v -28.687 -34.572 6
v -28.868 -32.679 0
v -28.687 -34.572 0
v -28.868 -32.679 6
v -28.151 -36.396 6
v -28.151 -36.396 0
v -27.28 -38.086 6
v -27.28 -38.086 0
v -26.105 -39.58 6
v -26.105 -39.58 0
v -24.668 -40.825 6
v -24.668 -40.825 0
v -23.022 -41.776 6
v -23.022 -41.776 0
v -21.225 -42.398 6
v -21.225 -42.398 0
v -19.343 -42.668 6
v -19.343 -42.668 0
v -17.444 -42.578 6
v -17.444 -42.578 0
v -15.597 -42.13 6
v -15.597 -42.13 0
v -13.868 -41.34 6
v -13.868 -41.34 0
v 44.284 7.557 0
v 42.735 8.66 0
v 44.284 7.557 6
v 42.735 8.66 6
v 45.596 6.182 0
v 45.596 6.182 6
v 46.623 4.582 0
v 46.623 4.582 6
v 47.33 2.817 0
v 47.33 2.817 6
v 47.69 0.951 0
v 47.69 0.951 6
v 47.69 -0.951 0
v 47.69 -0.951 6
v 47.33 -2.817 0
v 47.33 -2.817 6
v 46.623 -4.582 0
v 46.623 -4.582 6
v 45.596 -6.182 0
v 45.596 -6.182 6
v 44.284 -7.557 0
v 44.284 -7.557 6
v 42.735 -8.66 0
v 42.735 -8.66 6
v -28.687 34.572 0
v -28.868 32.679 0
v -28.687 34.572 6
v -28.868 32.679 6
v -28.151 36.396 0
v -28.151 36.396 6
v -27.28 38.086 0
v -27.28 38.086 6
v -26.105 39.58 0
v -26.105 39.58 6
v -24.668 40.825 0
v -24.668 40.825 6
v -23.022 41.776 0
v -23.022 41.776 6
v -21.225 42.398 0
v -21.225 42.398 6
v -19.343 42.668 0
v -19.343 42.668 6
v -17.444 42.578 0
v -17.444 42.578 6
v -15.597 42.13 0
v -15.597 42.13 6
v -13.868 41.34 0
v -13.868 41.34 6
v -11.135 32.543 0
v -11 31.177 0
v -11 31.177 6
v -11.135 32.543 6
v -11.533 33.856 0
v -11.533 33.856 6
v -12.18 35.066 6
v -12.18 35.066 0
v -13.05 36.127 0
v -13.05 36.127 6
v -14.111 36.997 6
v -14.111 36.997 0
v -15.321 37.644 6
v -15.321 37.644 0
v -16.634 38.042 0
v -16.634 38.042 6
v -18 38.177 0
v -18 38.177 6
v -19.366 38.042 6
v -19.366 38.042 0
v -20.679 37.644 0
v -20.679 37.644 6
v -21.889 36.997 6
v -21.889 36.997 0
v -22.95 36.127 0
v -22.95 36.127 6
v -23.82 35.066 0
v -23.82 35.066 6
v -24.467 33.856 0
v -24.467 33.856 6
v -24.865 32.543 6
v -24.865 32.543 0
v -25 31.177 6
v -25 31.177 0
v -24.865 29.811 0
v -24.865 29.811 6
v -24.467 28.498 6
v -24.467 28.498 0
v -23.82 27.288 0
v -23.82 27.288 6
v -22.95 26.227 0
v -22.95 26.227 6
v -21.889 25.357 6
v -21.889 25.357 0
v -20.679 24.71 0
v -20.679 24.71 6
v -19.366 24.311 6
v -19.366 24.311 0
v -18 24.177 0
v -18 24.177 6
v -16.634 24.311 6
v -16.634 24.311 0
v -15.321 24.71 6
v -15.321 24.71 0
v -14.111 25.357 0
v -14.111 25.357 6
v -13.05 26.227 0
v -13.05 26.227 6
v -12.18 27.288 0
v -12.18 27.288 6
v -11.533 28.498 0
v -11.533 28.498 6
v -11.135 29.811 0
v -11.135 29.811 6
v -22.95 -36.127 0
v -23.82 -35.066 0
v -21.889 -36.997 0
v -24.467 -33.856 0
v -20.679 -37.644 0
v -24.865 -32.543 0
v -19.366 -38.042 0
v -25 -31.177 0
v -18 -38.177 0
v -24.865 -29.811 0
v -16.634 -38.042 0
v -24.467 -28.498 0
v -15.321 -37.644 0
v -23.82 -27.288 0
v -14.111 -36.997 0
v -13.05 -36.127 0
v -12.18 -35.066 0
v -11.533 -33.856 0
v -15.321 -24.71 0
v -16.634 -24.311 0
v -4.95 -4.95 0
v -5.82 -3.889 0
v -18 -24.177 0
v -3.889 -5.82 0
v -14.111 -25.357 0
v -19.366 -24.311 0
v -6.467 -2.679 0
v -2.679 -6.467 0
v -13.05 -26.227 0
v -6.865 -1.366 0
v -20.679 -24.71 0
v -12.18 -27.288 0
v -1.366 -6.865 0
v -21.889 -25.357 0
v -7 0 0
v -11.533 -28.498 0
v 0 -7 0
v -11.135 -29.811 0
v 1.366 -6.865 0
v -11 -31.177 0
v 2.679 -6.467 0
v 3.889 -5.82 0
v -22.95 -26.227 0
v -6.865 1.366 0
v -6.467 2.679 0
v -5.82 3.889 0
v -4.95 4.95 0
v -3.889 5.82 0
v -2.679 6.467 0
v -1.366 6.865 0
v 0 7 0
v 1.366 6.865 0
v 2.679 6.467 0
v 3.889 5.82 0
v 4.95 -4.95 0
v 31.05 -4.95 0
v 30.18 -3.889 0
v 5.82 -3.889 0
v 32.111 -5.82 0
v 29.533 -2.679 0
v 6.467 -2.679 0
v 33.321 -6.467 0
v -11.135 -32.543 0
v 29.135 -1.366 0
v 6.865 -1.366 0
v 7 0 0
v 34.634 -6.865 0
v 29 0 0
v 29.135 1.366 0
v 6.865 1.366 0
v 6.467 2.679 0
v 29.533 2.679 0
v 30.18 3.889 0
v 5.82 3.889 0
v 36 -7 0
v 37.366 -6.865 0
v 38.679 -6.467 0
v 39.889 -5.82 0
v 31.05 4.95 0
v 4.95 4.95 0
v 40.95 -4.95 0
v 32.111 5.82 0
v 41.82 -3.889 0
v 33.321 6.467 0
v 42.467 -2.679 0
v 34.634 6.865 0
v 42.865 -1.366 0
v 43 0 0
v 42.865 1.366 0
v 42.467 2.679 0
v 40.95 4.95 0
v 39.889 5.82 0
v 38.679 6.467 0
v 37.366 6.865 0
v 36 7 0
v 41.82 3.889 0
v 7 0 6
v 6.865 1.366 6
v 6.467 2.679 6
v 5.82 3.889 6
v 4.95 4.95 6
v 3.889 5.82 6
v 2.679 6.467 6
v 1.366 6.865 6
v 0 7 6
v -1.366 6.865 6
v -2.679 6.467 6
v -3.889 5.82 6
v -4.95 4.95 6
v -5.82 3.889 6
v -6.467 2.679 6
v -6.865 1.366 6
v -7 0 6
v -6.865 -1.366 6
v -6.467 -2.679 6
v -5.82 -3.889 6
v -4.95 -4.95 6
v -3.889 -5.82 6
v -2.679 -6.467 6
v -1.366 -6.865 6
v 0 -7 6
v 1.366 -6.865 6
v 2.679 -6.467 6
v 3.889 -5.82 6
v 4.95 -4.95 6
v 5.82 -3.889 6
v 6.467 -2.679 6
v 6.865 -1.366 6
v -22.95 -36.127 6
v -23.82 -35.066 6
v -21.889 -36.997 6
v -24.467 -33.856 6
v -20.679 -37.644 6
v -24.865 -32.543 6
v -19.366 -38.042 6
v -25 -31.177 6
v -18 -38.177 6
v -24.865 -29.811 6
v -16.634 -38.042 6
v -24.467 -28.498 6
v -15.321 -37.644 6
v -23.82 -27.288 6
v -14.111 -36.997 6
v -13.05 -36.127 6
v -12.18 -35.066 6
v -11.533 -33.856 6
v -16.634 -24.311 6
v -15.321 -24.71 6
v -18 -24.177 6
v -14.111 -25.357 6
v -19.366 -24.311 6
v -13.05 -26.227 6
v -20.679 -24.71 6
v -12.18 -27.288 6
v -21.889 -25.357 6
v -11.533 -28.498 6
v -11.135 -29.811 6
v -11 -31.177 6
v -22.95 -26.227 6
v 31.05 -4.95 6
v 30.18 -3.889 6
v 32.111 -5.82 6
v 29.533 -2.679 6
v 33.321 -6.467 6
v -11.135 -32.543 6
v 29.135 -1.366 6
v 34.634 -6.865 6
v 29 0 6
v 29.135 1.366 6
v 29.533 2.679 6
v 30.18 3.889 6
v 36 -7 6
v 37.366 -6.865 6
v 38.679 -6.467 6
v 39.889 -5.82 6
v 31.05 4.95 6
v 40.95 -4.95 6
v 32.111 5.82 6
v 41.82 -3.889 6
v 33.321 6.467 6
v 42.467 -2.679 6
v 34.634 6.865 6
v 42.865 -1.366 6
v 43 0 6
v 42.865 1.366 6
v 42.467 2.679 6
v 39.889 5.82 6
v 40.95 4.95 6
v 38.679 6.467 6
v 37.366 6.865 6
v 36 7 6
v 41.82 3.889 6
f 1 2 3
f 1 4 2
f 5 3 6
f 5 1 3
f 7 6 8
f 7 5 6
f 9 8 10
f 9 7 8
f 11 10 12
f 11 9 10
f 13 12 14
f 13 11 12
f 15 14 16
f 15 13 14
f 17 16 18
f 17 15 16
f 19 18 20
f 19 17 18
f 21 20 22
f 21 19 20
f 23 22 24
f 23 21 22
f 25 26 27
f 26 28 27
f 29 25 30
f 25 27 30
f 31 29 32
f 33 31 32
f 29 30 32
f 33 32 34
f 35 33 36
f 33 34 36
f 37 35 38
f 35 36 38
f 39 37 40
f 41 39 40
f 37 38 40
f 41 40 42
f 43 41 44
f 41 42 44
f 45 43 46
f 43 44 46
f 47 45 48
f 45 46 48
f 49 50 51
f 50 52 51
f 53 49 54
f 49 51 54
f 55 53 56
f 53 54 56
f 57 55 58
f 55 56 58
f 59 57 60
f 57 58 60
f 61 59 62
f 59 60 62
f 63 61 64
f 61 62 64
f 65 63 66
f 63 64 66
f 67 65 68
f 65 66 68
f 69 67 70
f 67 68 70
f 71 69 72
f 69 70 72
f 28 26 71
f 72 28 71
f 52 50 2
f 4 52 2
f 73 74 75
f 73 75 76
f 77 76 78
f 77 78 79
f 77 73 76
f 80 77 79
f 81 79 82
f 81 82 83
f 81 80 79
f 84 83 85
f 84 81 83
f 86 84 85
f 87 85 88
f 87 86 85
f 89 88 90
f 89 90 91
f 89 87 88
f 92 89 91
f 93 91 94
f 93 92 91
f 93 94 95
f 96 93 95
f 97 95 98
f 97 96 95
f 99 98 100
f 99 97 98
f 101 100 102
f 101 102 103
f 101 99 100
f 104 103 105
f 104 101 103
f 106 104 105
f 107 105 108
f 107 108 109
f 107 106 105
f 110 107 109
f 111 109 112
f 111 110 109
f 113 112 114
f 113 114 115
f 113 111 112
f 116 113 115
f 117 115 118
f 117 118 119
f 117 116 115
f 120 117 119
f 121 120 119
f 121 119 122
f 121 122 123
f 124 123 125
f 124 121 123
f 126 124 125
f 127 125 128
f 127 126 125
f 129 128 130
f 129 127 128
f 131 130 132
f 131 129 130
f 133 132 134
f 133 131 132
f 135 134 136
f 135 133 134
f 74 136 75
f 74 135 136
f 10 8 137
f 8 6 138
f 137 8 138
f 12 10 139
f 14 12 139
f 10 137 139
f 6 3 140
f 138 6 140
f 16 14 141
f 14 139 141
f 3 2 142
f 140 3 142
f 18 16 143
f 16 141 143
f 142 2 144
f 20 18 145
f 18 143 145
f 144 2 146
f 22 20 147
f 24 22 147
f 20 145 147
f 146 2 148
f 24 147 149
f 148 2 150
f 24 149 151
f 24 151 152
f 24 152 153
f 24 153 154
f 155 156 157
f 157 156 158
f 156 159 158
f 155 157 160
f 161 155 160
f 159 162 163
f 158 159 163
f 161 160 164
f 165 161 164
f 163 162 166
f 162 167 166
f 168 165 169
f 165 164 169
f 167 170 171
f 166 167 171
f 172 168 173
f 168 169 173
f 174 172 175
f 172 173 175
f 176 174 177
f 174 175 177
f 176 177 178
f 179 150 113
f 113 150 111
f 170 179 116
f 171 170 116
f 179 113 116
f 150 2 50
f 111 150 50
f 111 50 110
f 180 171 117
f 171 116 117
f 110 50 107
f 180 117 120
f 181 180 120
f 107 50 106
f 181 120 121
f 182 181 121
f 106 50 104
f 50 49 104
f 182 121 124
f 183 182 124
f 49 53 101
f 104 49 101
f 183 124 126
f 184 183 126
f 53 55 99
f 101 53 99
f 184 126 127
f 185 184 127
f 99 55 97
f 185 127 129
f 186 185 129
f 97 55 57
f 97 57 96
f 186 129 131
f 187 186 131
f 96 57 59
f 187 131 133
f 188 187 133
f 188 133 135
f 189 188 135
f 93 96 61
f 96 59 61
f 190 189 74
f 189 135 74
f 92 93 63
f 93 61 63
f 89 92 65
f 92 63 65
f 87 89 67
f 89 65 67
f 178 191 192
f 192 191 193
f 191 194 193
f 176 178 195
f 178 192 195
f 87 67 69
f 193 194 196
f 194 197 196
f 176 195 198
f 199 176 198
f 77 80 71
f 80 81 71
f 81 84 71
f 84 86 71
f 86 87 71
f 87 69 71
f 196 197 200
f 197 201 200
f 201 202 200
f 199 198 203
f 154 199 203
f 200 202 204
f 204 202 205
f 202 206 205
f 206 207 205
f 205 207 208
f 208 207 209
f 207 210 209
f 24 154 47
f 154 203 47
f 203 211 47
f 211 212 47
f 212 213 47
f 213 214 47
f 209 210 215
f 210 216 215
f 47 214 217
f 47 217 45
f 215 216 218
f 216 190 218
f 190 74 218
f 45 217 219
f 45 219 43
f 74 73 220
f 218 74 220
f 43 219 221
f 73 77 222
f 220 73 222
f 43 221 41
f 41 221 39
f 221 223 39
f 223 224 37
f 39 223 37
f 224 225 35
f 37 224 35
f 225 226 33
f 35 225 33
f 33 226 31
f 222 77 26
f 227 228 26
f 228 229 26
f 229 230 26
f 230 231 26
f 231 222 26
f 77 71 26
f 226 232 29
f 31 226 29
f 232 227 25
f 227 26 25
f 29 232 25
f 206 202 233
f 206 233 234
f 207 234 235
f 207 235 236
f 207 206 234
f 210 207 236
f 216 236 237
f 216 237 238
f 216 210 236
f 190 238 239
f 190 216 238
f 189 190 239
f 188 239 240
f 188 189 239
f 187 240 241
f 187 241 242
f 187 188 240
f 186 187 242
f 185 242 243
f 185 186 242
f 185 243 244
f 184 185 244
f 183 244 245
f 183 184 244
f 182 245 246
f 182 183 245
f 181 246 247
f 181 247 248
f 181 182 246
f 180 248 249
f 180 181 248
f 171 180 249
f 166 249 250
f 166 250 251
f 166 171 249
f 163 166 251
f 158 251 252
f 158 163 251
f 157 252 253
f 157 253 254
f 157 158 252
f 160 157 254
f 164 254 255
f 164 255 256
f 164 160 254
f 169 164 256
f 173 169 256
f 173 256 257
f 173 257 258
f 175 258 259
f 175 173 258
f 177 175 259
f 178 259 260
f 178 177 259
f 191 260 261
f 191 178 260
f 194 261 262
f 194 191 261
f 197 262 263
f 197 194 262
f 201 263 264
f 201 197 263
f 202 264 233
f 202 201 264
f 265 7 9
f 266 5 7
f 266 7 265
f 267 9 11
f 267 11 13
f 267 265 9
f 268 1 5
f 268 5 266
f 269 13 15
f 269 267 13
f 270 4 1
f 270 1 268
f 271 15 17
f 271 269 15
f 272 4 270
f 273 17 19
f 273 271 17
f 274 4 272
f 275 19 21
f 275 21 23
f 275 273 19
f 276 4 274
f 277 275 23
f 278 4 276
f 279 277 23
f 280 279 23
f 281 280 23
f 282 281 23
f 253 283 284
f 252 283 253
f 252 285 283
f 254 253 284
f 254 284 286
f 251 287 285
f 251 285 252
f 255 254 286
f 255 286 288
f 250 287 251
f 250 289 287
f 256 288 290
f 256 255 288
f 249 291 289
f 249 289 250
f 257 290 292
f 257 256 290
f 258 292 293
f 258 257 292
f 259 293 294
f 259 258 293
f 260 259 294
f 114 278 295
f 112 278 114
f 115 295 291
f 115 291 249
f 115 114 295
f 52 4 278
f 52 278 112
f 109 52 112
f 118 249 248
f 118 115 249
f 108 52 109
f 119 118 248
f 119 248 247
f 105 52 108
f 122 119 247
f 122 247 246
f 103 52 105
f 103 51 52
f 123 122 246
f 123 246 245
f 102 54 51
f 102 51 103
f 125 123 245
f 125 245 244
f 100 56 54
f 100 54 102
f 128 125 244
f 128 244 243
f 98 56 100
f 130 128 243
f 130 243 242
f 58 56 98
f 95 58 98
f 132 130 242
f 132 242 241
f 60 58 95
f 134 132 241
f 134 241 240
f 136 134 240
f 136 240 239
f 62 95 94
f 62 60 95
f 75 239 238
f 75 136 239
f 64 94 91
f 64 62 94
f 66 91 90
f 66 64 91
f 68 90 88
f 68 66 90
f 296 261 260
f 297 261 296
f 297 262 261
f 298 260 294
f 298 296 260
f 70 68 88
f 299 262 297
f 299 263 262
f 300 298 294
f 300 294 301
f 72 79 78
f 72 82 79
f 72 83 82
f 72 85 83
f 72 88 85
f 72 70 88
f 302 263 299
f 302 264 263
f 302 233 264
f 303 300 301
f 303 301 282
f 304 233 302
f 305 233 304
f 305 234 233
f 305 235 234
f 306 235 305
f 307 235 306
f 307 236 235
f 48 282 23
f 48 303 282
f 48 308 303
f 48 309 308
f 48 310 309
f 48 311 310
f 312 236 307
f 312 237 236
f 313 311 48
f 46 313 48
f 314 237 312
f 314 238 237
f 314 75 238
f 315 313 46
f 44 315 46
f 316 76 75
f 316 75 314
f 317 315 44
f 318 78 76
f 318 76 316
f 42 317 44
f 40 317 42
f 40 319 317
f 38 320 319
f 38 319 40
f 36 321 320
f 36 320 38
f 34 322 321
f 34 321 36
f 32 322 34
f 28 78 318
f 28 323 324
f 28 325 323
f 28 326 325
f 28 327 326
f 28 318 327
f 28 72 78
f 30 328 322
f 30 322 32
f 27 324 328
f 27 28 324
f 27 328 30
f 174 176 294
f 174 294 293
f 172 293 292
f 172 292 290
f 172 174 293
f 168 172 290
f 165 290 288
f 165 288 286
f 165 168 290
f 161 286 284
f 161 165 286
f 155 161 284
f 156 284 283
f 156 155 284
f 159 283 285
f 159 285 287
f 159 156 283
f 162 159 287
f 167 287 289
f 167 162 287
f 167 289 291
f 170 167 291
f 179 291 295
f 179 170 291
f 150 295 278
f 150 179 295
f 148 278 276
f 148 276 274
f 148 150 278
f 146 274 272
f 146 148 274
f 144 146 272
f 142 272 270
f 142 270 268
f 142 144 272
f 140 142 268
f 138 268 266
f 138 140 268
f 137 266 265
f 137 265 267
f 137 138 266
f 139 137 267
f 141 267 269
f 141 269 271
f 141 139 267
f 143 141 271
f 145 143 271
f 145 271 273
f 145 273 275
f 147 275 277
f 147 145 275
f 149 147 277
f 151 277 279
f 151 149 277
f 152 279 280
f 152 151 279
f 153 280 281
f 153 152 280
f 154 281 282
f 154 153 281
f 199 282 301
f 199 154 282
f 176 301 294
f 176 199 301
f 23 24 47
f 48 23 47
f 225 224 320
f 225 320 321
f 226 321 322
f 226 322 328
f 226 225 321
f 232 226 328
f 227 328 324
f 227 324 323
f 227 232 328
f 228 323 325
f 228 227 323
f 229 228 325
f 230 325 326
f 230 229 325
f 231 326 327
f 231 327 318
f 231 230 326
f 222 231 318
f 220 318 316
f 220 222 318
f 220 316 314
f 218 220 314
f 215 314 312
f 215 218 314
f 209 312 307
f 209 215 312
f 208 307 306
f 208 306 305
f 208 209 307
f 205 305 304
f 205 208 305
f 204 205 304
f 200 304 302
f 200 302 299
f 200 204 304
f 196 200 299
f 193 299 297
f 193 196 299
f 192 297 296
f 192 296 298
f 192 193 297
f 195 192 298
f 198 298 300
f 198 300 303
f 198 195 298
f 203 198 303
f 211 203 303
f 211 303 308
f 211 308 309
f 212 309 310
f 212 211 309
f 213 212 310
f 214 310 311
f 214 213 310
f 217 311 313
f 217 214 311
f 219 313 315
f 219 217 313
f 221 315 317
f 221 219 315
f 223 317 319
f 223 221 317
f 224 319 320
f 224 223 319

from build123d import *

# Parameters (mm, degrees)
F0_R     = 7
F1_DEPTH = 6
F2_R     = 10


with BuildPart() as f1:
    # F0 (on Top) → F1 (new body)
    with BuildSketch(Plane.XY):
        Polygon((-28.867513, 50), (-28.867513, -50), (57.735027, 0), align=None)
        with Locations((-18, -31.176915)):
            Circle(F0_R, mode=Mode.SUBTRACT)
        Circle(F0_R, mode=Mode.SUBTRACT)
        with Locations((-18, 31.176915)):
            Circle(F0_R, mode=Mode.SUBTRACT)
        with Locations((36, 0)):
            Circle(F0_R, mode=Mode.SUBTRACT)
    extrude(amount=F1_DEPTH)

    # F2
    f2_edges = [f1.edges().sort_by_distance(p)[0] for p in [
        (-28.867513, -50, 3),
        (57.735027, 0, 3),
        (-28.867513, 50, 3),
    ]]
    fillet(f2_edges, radius=F2_R)


solid = f1.part
